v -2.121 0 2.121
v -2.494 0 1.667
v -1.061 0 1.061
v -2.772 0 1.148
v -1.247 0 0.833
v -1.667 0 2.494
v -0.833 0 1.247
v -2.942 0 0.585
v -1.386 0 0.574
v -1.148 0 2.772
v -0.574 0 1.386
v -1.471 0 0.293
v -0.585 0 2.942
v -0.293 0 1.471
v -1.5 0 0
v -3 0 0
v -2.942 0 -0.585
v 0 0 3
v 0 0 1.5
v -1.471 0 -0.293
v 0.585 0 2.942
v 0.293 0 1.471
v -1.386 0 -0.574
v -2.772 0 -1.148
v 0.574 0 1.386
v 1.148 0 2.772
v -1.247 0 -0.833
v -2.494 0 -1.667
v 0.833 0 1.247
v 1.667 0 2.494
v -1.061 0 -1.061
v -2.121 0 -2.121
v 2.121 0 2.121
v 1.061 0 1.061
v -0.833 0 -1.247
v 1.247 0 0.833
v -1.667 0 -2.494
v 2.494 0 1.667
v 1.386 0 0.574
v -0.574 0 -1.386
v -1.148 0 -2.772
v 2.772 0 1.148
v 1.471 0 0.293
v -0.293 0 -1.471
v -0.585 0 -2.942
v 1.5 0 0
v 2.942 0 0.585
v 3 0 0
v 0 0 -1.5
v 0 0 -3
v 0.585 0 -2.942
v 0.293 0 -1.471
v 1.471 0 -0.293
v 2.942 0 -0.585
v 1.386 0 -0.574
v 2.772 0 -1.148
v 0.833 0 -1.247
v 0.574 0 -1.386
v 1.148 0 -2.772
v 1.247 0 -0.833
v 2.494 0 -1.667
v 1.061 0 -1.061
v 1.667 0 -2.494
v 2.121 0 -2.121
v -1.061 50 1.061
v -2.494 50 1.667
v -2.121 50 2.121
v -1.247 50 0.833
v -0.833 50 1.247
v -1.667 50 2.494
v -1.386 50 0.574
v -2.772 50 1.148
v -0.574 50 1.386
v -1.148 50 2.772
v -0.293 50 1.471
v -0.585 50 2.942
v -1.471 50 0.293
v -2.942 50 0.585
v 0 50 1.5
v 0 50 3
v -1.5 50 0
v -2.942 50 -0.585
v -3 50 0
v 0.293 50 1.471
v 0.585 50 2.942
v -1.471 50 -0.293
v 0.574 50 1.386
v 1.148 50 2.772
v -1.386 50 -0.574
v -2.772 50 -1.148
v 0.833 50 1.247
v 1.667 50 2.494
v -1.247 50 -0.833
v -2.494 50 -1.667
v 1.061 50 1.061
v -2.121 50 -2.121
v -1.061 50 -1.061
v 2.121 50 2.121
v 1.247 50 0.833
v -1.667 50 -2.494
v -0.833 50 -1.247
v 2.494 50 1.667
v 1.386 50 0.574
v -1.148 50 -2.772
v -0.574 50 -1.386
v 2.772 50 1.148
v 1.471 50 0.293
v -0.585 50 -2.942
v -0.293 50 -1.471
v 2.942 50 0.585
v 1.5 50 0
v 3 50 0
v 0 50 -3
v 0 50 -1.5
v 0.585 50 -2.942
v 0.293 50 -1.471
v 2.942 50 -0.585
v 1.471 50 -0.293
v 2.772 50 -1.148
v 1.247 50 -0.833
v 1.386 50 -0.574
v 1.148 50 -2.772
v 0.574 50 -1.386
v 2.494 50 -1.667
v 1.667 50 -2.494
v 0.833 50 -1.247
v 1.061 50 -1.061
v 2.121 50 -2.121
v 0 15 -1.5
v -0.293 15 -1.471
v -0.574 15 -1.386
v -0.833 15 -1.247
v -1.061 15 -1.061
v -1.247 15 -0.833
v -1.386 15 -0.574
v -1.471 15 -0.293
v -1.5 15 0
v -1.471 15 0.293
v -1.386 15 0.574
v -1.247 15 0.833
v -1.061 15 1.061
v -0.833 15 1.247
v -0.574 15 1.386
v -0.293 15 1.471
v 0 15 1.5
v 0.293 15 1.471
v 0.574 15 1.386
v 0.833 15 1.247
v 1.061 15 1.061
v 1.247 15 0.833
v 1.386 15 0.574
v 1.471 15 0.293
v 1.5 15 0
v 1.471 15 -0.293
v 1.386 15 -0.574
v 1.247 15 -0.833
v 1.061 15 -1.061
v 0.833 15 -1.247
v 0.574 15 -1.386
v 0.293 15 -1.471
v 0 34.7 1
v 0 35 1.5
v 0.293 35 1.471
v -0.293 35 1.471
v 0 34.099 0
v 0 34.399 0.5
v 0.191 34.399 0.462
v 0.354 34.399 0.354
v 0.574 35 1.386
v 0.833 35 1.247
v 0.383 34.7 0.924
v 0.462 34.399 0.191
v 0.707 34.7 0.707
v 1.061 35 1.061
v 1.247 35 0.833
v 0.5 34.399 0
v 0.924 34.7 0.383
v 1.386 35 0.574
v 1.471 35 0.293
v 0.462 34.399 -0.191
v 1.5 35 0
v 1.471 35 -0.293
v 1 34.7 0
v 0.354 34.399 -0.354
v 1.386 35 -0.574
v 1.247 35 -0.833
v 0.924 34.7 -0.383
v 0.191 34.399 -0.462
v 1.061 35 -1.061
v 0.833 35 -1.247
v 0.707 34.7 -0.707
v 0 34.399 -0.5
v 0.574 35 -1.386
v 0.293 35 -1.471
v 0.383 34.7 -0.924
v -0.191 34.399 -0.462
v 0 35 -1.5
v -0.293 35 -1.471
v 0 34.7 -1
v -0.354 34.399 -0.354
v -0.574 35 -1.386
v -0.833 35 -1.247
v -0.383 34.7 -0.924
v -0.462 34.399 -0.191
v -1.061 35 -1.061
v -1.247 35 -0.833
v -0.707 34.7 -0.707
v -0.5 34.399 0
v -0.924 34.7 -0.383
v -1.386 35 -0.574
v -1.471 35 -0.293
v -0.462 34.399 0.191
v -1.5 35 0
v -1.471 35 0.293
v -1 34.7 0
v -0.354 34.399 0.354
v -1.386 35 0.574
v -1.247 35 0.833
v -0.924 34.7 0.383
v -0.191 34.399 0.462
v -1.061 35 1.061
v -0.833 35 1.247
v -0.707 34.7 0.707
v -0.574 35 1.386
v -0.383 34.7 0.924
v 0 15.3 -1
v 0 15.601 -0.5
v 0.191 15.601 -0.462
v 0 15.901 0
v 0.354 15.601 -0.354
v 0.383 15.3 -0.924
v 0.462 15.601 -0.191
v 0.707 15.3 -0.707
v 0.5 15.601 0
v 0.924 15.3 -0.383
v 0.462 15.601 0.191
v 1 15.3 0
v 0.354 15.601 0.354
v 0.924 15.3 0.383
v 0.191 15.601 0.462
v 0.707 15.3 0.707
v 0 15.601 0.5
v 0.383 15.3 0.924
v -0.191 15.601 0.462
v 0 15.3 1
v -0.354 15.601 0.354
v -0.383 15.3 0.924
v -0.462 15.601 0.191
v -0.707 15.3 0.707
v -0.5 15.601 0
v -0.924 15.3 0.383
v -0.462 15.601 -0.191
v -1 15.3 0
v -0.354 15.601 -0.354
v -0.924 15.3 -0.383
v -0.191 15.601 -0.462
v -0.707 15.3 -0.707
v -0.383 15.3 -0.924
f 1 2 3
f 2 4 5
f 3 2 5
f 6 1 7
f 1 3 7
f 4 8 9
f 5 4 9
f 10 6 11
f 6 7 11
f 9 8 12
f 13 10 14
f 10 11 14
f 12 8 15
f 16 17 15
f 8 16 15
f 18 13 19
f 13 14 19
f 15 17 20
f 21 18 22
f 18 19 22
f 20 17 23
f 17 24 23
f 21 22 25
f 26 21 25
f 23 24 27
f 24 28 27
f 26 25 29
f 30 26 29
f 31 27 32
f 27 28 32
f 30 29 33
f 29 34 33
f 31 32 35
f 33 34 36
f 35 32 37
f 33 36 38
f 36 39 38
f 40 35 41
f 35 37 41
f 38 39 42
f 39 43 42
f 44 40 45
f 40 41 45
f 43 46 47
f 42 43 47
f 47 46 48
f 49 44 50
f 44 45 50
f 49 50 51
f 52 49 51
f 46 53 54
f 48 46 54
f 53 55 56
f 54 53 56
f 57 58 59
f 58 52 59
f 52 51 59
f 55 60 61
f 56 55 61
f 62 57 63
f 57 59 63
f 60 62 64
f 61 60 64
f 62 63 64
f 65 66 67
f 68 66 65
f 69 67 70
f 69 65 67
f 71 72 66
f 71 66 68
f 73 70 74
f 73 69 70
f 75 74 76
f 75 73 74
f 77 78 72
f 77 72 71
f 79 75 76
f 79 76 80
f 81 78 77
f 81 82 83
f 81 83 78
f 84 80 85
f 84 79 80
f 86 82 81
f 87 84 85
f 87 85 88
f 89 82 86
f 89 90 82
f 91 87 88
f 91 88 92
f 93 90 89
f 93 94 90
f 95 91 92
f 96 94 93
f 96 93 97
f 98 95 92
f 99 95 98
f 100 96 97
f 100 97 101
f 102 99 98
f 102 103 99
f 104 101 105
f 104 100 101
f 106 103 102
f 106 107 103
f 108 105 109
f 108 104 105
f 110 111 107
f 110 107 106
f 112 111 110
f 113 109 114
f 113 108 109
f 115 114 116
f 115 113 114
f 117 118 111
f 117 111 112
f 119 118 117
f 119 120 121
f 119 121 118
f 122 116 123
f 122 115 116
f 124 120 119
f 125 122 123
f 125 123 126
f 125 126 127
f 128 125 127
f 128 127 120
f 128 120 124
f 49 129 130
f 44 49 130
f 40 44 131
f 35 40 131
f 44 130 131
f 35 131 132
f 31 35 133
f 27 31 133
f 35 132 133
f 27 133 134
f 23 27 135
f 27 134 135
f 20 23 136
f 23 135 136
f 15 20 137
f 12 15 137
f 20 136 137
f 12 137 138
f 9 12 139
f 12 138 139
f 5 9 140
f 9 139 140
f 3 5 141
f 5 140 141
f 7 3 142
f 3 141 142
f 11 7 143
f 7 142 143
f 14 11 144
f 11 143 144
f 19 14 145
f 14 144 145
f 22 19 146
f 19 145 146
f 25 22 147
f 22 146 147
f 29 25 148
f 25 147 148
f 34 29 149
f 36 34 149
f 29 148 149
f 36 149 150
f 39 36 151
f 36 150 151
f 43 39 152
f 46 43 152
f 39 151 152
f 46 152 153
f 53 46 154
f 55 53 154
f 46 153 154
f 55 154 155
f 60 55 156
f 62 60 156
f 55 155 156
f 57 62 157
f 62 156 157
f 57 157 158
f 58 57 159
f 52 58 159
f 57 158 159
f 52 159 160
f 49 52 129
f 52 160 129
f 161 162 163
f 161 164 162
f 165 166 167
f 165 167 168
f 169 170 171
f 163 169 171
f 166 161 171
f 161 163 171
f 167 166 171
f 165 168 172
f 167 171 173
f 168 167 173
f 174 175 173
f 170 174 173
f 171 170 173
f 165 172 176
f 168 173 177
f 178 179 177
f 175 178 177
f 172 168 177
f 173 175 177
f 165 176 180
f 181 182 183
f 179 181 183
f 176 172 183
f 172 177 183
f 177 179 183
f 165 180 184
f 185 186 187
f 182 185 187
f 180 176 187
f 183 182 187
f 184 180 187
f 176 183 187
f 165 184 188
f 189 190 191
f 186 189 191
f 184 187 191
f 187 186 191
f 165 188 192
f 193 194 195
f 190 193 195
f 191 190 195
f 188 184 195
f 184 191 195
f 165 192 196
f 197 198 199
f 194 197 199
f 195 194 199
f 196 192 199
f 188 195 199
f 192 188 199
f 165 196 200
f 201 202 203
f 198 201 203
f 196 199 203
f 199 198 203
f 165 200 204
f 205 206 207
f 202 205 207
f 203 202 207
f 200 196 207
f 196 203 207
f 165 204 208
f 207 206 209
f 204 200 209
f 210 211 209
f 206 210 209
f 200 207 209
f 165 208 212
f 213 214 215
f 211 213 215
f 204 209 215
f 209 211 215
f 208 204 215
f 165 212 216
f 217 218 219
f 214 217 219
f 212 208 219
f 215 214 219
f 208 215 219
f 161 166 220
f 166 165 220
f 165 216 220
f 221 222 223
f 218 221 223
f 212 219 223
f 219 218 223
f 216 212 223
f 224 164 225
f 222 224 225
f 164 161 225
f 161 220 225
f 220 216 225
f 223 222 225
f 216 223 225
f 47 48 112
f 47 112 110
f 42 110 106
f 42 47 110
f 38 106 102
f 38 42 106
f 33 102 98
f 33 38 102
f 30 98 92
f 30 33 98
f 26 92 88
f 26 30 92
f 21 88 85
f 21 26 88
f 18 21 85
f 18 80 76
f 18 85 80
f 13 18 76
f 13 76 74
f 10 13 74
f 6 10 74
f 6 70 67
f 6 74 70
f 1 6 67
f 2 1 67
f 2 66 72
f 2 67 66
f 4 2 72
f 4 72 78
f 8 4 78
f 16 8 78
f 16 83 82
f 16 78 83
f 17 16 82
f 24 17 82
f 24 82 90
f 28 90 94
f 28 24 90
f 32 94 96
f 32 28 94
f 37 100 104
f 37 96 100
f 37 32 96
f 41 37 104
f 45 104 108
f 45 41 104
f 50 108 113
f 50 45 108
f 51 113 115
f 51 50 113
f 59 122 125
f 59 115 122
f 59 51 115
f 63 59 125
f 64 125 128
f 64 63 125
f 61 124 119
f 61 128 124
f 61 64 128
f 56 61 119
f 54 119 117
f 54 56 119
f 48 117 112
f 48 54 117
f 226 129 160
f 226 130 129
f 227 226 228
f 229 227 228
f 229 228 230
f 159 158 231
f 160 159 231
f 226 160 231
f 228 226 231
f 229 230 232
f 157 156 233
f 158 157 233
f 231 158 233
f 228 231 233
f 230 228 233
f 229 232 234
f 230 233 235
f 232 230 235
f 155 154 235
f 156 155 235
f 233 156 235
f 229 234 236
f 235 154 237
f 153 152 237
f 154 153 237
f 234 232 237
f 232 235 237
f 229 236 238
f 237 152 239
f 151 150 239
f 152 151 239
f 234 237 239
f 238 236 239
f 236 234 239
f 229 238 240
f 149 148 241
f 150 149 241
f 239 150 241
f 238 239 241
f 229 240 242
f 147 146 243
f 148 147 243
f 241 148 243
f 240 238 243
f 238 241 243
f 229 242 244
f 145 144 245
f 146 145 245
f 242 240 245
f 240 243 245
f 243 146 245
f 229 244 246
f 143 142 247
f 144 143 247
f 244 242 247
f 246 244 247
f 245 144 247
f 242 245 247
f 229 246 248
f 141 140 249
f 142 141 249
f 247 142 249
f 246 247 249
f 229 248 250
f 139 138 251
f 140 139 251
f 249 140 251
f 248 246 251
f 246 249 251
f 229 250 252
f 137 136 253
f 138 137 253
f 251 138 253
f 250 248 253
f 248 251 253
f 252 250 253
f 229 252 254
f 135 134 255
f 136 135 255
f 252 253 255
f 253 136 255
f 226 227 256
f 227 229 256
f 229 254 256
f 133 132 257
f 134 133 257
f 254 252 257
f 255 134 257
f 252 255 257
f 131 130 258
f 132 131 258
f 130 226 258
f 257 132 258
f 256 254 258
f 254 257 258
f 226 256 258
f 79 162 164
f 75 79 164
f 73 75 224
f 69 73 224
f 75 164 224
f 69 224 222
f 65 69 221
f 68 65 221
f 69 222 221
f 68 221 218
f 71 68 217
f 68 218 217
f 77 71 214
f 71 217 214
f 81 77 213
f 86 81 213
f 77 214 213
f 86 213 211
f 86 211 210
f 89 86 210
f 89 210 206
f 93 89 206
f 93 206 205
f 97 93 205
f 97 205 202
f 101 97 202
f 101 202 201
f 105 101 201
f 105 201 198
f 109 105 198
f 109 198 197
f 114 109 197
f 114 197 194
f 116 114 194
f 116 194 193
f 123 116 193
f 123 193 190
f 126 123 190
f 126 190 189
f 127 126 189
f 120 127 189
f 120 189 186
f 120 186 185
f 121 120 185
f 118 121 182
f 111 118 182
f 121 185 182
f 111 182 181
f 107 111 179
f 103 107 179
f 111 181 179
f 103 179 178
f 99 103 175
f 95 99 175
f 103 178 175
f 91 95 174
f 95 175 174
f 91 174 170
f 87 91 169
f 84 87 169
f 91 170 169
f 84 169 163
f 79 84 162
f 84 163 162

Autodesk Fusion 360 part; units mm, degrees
sketch "Boceto1" plane through (0, 0, 0) normal (0, 1, 0) x (1, 0, 0)
  circle A0 centre (0, 0) radius 3
  dimension "d1" = 6
sketch "Boceto3" plane through (0, 0, 0) normal (0, -1, 0) x (1, 0, 0)
  circle A0 centre (0, 0) radius 3
  circle A1 centre (0, 0) radius 1.525
  dimension "d8" = 3.05
extrude "Extruir2" add sketch "Boceto1" along normal blind 50
sketch "Boceto4" plane through (0, 50, 0) normal (0, 1, 0) x (-1, 0, 0)
  circle A0 centre (0, 0) radius 3
  circle A1 centre (0, 0) radius 1.525
  dimension "d14" = 3.05
hole "Agujero3" at (0, 50, 0) direction (0, -1, 0) diameter 3 depth 15 tip angle 118
hole "Agujero4" at (0, 0, 0) direction (0, 1, 0) diameter 3 depth 15 tip angle 118
